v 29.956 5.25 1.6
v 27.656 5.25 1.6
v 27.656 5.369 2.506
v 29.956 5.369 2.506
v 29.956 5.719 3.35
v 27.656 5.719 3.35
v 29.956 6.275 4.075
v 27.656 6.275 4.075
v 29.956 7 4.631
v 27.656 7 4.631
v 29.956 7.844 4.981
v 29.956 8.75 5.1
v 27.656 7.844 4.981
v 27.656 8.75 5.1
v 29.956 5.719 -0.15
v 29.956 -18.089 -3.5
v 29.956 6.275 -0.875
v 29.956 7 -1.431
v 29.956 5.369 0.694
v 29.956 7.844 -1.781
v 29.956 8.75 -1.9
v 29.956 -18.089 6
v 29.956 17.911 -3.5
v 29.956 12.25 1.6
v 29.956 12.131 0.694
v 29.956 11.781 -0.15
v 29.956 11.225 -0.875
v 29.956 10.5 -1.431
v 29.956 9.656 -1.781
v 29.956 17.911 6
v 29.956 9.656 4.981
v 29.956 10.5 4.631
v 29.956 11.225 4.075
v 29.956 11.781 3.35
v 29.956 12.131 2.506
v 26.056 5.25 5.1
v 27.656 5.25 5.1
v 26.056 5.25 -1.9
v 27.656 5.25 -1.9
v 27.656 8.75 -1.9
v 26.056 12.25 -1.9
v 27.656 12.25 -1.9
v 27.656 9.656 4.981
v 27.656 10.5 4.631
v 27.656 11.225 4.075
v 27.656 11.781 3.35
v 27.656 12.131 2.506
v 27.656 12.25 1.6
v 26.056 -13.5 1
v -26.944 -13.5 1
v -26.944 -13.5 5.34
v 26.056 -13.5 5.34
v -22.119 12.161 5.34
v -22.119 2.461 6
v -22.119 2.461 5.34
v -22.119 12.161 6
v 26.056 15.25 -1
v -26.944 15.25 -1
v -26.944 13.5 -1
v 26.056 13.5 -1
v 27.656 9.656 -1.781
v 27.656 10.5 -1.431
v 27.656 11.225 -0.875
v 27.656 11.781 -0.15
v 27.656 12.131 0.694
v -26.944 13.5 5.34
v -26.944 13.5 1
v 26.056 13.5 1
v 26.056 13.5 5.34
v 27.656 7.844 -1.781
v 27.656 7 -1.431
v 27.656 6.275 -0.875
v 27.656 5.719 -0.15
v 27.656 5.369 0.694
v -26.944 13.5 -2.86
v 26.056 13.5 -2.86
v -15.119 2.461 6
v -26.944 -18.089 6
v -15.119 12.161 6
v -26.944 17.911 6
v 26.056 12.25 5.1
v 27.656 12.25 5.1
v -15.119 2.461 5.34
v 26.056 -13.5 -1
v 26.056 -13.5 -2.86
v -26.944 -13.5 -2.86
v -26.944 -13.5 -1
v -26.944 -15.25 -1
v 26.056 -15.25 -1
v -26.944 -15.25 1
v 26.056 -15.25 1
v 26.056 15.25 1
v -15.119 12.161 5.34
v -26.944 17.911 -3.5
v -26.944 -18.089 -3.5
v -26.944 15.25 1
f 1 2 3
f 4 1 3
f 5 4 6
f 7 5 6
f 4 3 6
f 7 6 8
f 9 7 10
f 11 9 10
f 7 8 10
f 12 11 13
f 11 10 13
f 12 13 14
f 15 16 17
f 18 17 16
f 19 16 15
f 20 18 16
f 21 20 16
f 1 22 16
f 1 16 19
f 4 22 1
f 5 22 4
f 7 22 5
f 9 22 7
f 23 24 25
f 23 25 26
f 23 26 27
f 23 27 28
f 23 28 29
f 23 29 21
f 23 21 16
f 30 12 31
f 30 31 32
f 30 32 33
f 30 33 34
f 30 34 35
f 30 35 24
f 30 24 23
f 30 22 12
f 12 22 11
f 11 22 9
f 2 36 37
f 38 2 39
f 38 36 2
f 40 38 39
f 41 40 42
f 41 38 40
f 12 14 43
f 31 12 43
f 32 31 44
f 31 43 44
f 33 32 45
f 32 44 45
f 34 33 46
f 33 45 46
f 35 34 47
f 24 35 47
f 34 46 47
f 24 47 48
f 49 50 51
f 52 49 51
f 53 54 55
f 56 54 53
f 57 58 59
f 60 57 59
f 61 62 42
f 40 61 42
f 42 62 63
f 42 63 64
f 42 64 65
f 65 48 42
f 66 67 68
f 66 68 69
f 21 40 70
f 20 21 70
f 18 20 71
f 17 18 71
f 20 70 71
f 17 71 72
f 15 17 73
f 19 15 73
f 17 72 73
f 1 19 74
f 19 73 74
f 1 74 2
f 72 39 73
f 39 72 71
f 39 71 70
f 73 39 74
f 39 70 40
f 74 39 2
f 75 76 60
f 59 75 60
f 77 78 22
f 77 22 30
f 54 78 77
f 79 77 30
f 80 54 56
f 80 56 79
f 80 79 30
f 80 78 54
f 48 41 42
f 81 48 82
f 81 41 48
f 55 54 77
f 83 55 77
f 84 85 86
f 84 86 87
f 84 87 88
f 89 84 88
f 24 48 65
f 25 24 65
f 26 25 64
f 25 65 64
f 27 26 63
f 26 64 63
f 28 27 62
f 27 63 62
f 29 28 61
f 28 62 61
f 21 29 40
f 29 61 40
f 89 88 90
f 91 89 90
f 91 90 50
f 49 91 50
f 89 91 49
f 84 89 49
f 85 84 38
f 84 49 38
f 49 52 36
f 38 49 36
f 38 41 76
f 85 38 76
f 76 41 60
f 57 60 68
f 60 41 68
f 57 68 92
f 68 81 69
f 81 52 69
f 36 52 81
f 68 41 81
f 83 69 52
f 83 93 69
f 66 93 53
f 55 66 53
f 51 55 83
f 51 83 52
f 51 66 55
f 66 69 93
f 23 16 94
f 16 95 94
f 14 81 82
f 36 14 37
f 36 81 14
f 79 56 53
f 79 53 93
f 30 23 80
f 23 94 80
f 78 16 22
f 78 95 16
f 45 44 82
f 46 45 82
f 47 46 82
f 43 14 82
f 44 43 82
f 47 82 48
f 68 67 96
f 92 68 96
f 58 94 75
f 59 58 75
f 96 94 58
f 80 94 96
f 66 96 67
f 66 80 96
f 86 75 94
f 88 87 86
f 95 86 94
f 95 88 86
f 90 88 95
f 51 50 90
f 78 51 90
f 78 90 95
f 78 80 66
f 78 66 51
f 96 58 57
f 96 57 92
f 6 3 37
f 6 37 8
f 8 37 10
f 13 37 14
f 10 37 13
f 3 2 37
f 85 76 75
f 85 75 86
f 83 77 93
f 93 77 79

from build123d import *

# Parameters (mm, degrees)
F1_DEPTH      = 6
F1_DEPTH_BACK = 3.5
F2_W          = 1.75
F2_H          = 2
F2_W_2        = 27
F2_H_2        = 1.8599129291
F2_H_3        = 4.3400870709
F3_DEPTH      = 53.001
F4_W          = 7
F4_H          = 9.7
F5_DEPTH      = 0.6599129291
F6_W          = 36
F6_H          = 9.5
F7_DEPTH      = 3.9
F8_DEPTH      = 1.6


with BuildPart() as f1:
    # F0 (on Top) → F1 (new body, two sides)
    with BuildSketch(Plane.XY) as f1_sk:
        Polygon((23.0564765632, 14.9109546933), (-26.9435234368, 14.9109546933), (-26.9435234368, -4.6890453067), (-26.9435234368, -11.6890453067), (-26.9435234368, -15.0890453067), (23.0564765632, -15.0890453067), align=None)
        Polygon((-26.9435234368, 17.9109546933), (-26.9435234368, 14.9109546933), (23.0564765632, 14.9109546933), (23.0564765632, -15.0890453067), (-26.9435234368, -15.0890453067), (-26.9435234368, -18.0890453067), (26.0564765632, -18.0890453067), (26.0564765632, 17.9109546933), align=None)
    extrude(amount=F1_DEPTH)
    extrude(f1_sk.sketch, amount=-F1_DEPTH_BACK)

    # F2 (on face) → F3 (cut, through all)
    with BuildSketch(Plane(origin=(-26.9435234368, 0, 0), x_dir=(0, -1, 0), z_dir=(-1, 0, 0))):
        with Locations((14.375, 0)):
            Rectangle(F2_W, F2_H)
        with Locations((0, -1.9299564646)):
            Rectangle(F2_W_2, F2_H_2)
        with Locations((-14.375, 0)):
            Rectangle(F2_W, F2_H)
        Rectangle(F2_W_2, F2_H)
        with Locations((0, 3.1700435354)):
            Rectangle(F2_W_2, F2_H_3)
    extrude(amount=-F3_DEPTH, mode=Mode.SUBTRACT)

    # F4 (on face) → F5 (cut, through all)
    with BuildSketch(Plane.XY.offset(6)):
        with Locations((-18.6190935215, 7.3109546933)):
            Rectangle(F4_W, F4_H)
    extrude(amount=-F5_DEPTH, mode=Mode.SUBTRACT)

    # F6 (on face) → F7 (join)
    with BuildSketch(Plane.YZ.offset(26.0564765632)):
        with Locations((-0.0890453067, 1.25)):
            Rectangle(F6_W, F6_H)
        Polygon((-15.25, -1), (-15.25, 1), (-13.5, 1), (-13.5, 5.3400870709), (13.5, 5.3400870709), (13.5, 1), (15.25, 1), (15.25, -1), (13.5, -1), (13.5, -2.8599129291), (-13.5, -2.8599129291), (-13.5, -1), align=None, mode=Mode.SUBTRACT)
        Polygon((-13.5, 1), (-15.25, 1), (-15.25, -1), (-13.5, -1), (-13.5, -2.8599129291), (13.5, -2.8599129291), (13.5, -1), (15.25, -1), (15.25, 1), (13.5, 1), (13.5, 5.3400870709), (-13.5, 5.3400870709), align=None)
        Polygon((5.25, 1.6), (5.25, 5.1), (8.75, 5.1), (12.25, 5.1), (12.25, 1.6), (12.25, -1.9), (8.75, -1.9), (5.25, -1.9), align=None, mode=Mode.SUBTRACT)
        with BuildLine():
            Line((8.75, 5.1), (5.25, 5.1))
            Line((5.25, 5.1), (5.25, 1.6))
            ThreePointArc((5.25, 1.6), (6.2751262658, 4.0748737342), (8.75, 5.1))
        make_face()
        with BuildLine():
            Line((12.25, 5.1), (8.75, 5.1))
            ThreePointArc((8.75, 5.1), (11.2248737342, 4.0748737342), (12.25, 1.6))
            Line((12.25, 1.6), (12.25, 5.1))
        make_face()
        with BuildLine():
            Line((12.25, -1.9), (12.25, 1.6))
            ThreePointArc((12.25, 1.6), (11.2248737342, -0.8748737342), (8.75, -1.9))
            Line((8.75, -1.9), (12.25, -1.9))
        make_face()
        with BuildLine():
            ThreePointArc((8.75, -1.9), (6.2751262658, -0.8748737342), (5.25, 1.6))
            Line((5.25, 1.6), (5.25, -1.9))
            Line((5.25, -1.9), (8.75, -1.9))
        make_face()
    extrude(amount=F7_DEPTH)

    # F6 (on face) → F8 (cut)
    with BuildSketch(Plane.YZ.offset(26.0564765632)):
        with BuildLine():
            Line((8.75, 5.1), (5.25, 5.1))
            Line((5.25, 5.1), (5.25, 1.6))
            ThreePointArc((5.25, 1.6), (6.2751262658, 4.0748737342), (8.75, 5.1))
        make_face()
        with BuildLine():
            Line((12.25, 5.1), (8.75, 5.1))
            ThreePointArc((8.75, 5.1), (11.2248737342, 4.0748737342), (12.25, 1.6))
            Line((12.25, 1.6), (12.25, 5.1))
        make_face()
        with BuildLine():
            Line((12.25, -1.9), (12.25, 1.6))
            ThreePointArc((12.25, 1.6), (11.2248737342, -0.8748737342), (8.75, -1.9))
            Line((8.75, -1.9), (12.25, -1.9))
        make_face()
        with BuildLine():
            ThreePointArc((8.75, -1.9), (6.2751262658, -0.8748737342), (5.25, 1.6))
            Line((5.25, 1.6), (5.25, -1.9))
            Line((5.25, -1.9), (8.75, -1.9))
        make_face()
    extrude(amount=F8_DEPTH, mode=Mode.SUBTRACT)


solid = f1.part
